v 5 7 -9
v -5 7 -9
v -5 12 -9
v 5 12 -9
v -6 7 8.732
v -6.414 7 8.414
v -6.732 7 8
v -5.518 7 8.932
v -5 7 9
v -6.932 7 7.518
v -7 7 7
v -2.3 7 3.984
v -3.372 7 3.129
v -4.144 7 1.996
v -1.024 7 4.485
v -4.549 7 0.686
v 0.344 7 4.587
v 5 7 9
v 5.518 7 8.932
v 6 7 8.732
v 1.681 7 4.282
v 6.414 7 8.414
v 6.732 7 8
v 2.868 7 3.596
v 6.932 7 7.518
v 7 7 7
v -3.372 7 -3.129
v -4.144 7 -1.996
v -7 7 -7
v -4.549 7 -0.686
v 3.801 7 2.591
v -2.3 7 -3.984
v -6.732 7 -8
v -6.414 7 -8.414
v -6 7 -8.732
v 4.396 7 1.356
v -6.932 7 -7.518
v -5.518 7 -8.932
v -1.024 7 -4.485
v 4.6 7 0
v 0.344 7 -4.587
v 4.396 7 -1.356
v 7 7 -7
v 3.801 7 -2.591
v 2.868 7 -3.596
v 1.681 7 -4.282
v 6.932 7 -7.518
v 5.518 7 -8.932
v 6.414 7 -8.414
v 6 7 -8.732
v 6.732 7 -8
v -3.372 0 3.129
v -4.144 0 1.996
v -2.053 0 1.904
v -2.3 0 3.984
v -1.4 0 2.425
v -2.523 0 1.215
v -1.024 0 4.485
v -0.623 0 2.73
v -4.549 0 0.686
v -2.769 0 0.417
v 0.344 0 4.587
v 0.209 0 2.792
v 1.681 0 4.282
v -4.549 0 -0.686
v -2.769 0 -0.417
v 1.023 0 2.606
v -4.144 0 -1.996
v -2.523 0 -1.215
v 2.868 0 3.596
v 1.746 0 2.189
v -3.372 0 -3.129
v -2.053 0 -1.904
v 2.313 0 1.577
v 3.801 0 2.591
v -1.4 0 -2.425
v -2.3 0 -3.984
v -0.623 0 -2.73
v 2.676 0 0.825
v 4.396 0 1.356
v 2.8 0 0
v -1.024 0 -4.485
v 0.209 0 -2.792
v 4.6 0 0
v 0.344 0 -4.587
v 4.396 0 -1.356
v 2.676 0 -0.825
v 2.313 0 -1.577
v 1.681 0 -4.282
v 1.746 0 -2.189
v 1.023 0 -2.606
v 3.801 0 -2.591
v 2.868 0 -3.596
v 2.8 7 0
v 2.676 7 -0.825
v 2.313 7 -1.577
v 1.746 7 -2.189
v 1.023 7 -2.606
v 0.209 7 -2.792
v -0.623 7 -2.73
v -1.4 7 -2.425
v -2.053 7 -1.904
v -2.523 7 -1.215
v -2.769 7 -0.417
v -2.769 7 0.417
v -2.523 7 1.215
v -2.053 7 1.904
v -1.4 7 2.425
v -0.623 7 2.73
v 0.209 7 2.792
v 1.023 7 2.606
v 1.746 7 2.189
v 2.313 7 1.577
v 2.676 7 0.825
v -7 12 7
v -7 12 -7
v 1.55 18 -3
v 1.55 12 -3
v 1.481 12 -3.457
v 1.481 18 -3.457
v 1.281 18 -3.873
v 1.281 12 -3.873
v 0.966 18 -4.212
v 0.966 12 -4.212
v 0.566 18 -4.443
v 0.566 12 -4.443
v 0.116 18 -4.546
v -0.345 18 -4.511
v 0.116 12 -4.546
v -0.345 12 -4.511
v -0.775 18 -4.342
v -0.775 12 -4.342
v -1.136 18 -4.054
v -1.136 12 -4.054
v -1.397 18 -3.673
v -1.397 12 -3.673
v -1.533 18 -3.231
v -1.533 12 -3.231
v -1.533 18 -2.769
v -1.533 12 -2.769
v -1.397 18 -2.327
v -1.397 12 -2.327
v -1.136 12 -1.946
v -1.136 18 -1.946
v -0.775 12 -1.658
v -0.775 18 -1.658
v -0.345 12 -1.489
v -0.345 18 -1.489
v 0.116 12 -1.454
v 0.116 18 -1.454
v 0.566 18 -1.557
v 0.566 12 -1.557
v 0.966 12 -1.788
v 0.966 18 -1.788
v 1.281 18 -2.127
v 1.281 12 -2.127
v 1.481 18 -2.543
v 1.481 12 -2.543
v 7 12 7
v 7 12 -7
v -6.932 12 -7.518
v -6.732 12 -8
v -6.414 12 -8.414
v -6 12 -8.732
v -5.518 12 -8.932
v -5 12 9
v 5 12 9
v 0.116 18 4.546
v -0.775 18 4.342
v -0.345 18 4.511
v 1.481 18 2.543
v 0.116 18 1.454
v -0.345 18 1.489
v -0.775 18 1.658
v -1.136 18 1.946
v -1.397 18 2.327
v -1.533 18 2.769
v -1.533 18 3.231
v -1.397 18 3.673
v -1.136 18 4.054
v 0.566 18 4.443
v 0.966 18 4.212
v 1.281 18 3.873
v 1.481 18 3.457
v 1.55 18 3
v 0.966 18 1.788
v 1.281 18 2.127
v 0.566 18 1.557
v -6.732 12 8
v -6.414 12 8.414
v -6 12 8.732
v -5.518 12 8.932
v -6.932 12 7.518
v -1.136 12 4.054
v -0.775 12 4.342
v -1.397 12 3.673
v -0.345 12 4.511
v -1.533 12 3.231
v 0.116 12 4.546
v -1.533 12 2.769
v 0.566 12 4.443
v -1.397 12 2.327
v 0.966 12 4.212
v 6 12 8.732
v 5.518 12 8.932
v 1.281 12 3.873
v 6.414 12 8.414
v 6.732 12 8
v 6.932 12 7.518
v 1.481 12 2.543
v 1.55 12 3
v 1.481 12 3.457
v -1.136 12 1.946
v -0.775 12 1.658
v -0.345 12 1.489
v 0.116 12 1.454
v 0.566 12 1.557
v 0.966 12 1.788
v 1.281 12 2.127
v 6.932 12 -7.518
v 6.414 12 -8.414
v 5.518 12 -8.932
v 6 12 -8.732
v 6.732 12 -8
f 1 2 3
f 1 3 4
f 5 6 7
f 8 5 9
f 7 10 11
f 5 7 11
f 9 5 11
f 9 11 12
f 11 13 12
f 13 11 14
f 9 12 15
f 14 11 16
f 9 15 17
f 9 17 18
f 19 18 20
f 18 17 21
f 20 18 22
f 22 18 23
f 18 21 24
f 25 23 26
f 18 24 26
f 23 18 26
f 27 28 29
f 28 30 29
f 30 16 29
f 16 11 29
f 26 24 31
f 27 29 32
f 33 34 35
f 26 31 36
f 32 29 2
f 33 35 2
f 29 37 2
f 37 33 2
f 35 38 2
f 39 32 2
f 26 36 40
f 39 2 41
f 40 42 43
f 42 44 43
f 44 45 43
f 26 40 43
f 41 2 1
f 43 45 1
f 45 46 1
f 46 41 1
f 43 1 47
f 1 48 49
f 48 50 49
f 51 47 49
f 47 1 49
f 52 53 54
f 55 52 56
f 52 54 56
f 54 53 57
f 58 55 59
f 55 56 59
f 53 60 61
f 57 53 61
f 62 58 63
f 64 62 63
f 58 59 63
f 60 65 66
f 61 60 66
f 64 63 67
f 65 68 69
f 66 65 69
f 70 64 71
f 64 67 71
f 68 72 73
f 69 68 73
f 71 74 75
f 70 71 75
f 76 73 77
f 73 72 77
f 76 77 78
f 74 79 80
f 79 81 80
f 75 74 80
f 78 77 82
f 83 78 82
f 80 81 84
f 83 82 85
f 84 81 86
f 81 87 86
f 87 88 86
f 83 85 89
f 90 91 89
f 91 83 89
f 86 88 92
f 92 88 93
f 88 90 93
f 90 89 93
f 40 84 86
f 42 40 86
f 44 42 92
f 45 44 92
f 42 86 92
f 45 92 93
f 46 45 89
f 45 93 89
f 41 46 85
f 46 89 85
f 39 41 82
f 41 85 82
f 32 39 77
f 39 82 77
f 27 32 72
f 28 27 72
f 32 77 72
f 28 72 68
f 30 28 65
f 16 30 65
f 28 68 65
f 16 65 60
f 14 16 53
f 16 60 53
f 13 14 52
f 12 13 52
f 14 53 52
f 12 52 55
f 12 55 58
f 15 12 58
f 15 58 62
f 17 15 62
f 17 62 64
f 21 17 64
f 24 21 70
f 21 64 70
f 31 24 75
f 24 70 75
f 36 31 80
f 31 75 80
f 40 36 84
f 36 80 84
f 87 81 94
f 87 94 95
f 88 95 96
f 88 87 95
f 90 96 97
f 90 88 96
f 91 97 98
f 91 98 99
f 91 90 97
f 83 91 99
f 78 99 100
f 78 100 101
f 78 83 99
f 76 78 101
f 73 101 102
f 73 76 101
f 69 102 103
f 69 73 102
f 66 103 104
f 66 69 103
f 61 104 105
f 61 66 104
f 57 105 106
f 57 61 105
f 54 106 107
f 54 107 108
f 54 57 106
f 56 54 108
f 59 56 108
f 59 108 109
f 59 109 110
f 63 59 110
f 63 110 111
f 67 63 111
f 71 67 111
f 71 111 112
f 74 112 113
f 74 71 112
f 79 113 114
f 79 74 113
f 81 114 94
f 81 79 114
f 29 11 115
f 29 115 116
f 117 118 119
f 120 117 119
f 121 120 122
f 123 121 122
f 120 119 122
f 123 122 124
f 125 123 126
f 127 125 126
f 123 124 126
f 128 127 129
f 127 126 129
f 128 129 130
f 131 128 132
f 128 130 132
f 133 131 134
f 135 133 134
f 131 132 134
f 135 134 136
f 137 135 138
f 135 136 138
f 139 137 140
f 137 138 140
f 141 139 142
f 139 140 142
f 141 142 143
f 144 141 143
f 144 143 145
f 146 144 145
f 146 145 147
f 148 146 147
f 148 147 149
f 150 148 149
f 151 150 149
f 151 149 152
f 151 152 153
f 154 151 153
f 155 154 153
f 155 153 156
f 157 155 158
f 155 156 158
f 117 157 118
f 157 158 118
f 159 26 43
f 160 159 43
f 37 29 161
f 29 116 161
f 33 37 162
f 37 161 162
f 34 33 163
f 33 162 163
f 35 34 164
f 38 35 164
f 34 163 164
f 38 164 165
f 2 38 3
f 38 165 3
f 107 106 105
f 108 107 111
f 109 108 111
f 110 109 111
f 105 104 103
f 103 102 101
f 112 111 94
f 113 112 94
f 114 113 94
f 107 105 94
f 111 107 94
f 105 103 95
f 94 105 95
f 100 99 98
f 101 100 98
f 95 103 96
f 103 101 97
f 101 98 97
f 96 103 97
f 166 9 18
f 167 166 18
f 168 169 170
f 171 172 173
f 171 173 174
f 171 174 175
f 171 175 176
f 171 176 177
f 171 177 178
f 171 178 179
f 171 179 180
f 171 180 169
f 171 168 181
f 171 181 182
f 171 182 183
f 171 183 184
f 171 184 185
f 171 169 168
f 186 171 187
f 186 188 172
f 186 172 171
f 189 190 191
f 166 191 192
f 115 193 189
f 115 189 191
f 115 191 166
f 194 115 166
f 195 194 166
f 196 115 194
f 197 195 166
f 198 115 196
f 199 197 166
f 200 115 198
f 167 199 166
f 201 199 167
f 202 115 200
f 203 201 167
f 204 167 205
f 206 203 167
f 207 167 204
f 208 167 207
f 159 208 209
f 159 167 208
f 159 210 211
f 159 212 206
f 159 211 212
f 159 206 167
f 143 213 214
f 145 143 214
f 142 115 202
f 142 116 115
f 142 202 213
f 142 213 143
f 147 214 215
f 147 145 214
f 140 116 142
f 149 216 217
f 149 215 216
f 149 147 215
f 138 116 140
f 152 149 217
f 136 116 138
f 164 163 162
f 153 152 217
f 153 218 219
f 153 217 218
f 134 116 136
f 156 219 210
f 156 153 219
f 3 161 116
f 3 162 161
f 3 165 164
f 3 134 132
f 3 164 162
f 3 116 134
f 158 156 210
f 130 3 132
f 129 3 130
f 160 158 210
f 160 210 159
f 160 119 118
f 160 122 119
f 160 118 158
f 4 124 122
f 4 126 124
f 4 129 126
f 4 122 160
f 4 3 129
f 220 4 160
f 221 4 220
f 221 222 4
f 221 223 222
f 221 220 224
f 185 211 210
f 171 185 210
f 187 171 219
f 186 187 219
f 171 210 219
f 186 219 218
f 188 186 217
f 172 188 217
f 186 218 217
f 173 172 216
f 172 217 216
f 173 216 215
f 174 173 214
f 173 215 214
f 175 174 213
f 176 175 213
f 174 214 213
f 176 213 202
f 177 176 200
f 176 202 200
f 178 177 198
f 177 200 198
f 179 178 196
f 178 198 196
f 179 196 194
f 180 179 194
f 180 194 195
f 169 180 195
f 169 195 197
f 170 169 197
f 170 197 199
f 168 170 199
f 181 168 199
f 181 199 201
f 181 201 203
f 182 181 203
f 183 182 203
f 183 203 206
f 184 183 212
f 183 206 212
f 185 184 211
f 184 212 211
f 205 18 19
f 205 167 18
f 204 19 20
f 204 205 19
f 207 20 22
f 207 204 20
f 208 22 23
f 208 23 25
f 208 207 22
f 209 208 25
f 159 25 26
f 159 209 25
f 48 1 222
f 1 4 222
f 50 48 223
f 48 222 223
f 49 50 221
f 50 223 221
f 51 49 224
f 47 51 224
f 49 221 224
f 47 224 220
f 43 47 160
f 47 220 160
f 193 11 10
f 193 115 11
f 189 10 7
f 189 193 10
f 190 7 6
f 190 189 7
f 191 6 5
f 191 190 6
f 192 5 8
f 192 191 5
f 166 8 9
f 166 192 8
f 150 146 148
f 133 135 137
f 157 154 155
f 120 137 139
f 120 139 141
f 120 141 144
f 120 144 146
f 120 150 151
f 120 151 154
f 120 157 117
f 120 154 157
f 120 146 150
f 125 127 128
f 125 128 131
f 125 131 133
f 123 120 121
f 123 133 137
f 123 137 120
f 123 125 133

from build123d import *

# Parameters (mm, degrees)
SKETCH1_R           = 4.6
SKETCH1_R_2         = 2.8
ACOPLE_PALITO_DEPTH = 7
CUERPO_START        = 7
SKETCH1_3_W         = 14
SKETCH1_3_H         = 18
CUERPO_DEPTH        = 5
SKETCH2_R           = 1.55
ACOPLE_SENSOR_DEPTH = 6
FILLET1_R           = 2


with BuildPart() as part:
    # Sketch1 → Acople palito (new body)
    with BuildSketch(Plane(origin=(0, 0, 0), x_dir=(1, 0, 0), z_dir=(0, 1, 0))):
        Circle(SKETCH1_R)
        Circle(SKETCH1_R_2, mode=Mode.SUBTRACT)
    extrude(amount=ACOPLE_PALITO_DEPTH)

    # Sketch1<3> → Cuerpo (add)
    with BuildSketch(Plane(origin=(0, 0, 0), x_dir=(1, 0, 0), z_dir=(0, 1, 0)).offset(CUERPO_START)):
        Rectangle(SKETCH1_3_W, SKETCH1_3_H)
    extrude(amount=CUERPO_DEPTH)

    # Sketch2 → Acople sensor (add)
    with BuildSketch(Plane(origin=(0, 12, 0), x_dir=(1, 0, 0), z_dir=(0, 1, 0))):
        with Locations((0, 3)):
            Circle(SKETCH2_R)
        with Locations((0, -3)):
            Circle(SKETCH2_R)
    extrude(amount=ACOPLE_SENSOR_DEPTH)

    # Fillet1
    fillet1_edges = [part.edges().sort_by_distance(p)[0] for p in [
        (7, 9.5, 9),
        (-7, 9.5, 9),
        (-7, 9.5, -9),
        (7, 9.5, -9),
    ]]
    fillet(fillet1_edges, radius=FILLET1_R)


solid = part.part
